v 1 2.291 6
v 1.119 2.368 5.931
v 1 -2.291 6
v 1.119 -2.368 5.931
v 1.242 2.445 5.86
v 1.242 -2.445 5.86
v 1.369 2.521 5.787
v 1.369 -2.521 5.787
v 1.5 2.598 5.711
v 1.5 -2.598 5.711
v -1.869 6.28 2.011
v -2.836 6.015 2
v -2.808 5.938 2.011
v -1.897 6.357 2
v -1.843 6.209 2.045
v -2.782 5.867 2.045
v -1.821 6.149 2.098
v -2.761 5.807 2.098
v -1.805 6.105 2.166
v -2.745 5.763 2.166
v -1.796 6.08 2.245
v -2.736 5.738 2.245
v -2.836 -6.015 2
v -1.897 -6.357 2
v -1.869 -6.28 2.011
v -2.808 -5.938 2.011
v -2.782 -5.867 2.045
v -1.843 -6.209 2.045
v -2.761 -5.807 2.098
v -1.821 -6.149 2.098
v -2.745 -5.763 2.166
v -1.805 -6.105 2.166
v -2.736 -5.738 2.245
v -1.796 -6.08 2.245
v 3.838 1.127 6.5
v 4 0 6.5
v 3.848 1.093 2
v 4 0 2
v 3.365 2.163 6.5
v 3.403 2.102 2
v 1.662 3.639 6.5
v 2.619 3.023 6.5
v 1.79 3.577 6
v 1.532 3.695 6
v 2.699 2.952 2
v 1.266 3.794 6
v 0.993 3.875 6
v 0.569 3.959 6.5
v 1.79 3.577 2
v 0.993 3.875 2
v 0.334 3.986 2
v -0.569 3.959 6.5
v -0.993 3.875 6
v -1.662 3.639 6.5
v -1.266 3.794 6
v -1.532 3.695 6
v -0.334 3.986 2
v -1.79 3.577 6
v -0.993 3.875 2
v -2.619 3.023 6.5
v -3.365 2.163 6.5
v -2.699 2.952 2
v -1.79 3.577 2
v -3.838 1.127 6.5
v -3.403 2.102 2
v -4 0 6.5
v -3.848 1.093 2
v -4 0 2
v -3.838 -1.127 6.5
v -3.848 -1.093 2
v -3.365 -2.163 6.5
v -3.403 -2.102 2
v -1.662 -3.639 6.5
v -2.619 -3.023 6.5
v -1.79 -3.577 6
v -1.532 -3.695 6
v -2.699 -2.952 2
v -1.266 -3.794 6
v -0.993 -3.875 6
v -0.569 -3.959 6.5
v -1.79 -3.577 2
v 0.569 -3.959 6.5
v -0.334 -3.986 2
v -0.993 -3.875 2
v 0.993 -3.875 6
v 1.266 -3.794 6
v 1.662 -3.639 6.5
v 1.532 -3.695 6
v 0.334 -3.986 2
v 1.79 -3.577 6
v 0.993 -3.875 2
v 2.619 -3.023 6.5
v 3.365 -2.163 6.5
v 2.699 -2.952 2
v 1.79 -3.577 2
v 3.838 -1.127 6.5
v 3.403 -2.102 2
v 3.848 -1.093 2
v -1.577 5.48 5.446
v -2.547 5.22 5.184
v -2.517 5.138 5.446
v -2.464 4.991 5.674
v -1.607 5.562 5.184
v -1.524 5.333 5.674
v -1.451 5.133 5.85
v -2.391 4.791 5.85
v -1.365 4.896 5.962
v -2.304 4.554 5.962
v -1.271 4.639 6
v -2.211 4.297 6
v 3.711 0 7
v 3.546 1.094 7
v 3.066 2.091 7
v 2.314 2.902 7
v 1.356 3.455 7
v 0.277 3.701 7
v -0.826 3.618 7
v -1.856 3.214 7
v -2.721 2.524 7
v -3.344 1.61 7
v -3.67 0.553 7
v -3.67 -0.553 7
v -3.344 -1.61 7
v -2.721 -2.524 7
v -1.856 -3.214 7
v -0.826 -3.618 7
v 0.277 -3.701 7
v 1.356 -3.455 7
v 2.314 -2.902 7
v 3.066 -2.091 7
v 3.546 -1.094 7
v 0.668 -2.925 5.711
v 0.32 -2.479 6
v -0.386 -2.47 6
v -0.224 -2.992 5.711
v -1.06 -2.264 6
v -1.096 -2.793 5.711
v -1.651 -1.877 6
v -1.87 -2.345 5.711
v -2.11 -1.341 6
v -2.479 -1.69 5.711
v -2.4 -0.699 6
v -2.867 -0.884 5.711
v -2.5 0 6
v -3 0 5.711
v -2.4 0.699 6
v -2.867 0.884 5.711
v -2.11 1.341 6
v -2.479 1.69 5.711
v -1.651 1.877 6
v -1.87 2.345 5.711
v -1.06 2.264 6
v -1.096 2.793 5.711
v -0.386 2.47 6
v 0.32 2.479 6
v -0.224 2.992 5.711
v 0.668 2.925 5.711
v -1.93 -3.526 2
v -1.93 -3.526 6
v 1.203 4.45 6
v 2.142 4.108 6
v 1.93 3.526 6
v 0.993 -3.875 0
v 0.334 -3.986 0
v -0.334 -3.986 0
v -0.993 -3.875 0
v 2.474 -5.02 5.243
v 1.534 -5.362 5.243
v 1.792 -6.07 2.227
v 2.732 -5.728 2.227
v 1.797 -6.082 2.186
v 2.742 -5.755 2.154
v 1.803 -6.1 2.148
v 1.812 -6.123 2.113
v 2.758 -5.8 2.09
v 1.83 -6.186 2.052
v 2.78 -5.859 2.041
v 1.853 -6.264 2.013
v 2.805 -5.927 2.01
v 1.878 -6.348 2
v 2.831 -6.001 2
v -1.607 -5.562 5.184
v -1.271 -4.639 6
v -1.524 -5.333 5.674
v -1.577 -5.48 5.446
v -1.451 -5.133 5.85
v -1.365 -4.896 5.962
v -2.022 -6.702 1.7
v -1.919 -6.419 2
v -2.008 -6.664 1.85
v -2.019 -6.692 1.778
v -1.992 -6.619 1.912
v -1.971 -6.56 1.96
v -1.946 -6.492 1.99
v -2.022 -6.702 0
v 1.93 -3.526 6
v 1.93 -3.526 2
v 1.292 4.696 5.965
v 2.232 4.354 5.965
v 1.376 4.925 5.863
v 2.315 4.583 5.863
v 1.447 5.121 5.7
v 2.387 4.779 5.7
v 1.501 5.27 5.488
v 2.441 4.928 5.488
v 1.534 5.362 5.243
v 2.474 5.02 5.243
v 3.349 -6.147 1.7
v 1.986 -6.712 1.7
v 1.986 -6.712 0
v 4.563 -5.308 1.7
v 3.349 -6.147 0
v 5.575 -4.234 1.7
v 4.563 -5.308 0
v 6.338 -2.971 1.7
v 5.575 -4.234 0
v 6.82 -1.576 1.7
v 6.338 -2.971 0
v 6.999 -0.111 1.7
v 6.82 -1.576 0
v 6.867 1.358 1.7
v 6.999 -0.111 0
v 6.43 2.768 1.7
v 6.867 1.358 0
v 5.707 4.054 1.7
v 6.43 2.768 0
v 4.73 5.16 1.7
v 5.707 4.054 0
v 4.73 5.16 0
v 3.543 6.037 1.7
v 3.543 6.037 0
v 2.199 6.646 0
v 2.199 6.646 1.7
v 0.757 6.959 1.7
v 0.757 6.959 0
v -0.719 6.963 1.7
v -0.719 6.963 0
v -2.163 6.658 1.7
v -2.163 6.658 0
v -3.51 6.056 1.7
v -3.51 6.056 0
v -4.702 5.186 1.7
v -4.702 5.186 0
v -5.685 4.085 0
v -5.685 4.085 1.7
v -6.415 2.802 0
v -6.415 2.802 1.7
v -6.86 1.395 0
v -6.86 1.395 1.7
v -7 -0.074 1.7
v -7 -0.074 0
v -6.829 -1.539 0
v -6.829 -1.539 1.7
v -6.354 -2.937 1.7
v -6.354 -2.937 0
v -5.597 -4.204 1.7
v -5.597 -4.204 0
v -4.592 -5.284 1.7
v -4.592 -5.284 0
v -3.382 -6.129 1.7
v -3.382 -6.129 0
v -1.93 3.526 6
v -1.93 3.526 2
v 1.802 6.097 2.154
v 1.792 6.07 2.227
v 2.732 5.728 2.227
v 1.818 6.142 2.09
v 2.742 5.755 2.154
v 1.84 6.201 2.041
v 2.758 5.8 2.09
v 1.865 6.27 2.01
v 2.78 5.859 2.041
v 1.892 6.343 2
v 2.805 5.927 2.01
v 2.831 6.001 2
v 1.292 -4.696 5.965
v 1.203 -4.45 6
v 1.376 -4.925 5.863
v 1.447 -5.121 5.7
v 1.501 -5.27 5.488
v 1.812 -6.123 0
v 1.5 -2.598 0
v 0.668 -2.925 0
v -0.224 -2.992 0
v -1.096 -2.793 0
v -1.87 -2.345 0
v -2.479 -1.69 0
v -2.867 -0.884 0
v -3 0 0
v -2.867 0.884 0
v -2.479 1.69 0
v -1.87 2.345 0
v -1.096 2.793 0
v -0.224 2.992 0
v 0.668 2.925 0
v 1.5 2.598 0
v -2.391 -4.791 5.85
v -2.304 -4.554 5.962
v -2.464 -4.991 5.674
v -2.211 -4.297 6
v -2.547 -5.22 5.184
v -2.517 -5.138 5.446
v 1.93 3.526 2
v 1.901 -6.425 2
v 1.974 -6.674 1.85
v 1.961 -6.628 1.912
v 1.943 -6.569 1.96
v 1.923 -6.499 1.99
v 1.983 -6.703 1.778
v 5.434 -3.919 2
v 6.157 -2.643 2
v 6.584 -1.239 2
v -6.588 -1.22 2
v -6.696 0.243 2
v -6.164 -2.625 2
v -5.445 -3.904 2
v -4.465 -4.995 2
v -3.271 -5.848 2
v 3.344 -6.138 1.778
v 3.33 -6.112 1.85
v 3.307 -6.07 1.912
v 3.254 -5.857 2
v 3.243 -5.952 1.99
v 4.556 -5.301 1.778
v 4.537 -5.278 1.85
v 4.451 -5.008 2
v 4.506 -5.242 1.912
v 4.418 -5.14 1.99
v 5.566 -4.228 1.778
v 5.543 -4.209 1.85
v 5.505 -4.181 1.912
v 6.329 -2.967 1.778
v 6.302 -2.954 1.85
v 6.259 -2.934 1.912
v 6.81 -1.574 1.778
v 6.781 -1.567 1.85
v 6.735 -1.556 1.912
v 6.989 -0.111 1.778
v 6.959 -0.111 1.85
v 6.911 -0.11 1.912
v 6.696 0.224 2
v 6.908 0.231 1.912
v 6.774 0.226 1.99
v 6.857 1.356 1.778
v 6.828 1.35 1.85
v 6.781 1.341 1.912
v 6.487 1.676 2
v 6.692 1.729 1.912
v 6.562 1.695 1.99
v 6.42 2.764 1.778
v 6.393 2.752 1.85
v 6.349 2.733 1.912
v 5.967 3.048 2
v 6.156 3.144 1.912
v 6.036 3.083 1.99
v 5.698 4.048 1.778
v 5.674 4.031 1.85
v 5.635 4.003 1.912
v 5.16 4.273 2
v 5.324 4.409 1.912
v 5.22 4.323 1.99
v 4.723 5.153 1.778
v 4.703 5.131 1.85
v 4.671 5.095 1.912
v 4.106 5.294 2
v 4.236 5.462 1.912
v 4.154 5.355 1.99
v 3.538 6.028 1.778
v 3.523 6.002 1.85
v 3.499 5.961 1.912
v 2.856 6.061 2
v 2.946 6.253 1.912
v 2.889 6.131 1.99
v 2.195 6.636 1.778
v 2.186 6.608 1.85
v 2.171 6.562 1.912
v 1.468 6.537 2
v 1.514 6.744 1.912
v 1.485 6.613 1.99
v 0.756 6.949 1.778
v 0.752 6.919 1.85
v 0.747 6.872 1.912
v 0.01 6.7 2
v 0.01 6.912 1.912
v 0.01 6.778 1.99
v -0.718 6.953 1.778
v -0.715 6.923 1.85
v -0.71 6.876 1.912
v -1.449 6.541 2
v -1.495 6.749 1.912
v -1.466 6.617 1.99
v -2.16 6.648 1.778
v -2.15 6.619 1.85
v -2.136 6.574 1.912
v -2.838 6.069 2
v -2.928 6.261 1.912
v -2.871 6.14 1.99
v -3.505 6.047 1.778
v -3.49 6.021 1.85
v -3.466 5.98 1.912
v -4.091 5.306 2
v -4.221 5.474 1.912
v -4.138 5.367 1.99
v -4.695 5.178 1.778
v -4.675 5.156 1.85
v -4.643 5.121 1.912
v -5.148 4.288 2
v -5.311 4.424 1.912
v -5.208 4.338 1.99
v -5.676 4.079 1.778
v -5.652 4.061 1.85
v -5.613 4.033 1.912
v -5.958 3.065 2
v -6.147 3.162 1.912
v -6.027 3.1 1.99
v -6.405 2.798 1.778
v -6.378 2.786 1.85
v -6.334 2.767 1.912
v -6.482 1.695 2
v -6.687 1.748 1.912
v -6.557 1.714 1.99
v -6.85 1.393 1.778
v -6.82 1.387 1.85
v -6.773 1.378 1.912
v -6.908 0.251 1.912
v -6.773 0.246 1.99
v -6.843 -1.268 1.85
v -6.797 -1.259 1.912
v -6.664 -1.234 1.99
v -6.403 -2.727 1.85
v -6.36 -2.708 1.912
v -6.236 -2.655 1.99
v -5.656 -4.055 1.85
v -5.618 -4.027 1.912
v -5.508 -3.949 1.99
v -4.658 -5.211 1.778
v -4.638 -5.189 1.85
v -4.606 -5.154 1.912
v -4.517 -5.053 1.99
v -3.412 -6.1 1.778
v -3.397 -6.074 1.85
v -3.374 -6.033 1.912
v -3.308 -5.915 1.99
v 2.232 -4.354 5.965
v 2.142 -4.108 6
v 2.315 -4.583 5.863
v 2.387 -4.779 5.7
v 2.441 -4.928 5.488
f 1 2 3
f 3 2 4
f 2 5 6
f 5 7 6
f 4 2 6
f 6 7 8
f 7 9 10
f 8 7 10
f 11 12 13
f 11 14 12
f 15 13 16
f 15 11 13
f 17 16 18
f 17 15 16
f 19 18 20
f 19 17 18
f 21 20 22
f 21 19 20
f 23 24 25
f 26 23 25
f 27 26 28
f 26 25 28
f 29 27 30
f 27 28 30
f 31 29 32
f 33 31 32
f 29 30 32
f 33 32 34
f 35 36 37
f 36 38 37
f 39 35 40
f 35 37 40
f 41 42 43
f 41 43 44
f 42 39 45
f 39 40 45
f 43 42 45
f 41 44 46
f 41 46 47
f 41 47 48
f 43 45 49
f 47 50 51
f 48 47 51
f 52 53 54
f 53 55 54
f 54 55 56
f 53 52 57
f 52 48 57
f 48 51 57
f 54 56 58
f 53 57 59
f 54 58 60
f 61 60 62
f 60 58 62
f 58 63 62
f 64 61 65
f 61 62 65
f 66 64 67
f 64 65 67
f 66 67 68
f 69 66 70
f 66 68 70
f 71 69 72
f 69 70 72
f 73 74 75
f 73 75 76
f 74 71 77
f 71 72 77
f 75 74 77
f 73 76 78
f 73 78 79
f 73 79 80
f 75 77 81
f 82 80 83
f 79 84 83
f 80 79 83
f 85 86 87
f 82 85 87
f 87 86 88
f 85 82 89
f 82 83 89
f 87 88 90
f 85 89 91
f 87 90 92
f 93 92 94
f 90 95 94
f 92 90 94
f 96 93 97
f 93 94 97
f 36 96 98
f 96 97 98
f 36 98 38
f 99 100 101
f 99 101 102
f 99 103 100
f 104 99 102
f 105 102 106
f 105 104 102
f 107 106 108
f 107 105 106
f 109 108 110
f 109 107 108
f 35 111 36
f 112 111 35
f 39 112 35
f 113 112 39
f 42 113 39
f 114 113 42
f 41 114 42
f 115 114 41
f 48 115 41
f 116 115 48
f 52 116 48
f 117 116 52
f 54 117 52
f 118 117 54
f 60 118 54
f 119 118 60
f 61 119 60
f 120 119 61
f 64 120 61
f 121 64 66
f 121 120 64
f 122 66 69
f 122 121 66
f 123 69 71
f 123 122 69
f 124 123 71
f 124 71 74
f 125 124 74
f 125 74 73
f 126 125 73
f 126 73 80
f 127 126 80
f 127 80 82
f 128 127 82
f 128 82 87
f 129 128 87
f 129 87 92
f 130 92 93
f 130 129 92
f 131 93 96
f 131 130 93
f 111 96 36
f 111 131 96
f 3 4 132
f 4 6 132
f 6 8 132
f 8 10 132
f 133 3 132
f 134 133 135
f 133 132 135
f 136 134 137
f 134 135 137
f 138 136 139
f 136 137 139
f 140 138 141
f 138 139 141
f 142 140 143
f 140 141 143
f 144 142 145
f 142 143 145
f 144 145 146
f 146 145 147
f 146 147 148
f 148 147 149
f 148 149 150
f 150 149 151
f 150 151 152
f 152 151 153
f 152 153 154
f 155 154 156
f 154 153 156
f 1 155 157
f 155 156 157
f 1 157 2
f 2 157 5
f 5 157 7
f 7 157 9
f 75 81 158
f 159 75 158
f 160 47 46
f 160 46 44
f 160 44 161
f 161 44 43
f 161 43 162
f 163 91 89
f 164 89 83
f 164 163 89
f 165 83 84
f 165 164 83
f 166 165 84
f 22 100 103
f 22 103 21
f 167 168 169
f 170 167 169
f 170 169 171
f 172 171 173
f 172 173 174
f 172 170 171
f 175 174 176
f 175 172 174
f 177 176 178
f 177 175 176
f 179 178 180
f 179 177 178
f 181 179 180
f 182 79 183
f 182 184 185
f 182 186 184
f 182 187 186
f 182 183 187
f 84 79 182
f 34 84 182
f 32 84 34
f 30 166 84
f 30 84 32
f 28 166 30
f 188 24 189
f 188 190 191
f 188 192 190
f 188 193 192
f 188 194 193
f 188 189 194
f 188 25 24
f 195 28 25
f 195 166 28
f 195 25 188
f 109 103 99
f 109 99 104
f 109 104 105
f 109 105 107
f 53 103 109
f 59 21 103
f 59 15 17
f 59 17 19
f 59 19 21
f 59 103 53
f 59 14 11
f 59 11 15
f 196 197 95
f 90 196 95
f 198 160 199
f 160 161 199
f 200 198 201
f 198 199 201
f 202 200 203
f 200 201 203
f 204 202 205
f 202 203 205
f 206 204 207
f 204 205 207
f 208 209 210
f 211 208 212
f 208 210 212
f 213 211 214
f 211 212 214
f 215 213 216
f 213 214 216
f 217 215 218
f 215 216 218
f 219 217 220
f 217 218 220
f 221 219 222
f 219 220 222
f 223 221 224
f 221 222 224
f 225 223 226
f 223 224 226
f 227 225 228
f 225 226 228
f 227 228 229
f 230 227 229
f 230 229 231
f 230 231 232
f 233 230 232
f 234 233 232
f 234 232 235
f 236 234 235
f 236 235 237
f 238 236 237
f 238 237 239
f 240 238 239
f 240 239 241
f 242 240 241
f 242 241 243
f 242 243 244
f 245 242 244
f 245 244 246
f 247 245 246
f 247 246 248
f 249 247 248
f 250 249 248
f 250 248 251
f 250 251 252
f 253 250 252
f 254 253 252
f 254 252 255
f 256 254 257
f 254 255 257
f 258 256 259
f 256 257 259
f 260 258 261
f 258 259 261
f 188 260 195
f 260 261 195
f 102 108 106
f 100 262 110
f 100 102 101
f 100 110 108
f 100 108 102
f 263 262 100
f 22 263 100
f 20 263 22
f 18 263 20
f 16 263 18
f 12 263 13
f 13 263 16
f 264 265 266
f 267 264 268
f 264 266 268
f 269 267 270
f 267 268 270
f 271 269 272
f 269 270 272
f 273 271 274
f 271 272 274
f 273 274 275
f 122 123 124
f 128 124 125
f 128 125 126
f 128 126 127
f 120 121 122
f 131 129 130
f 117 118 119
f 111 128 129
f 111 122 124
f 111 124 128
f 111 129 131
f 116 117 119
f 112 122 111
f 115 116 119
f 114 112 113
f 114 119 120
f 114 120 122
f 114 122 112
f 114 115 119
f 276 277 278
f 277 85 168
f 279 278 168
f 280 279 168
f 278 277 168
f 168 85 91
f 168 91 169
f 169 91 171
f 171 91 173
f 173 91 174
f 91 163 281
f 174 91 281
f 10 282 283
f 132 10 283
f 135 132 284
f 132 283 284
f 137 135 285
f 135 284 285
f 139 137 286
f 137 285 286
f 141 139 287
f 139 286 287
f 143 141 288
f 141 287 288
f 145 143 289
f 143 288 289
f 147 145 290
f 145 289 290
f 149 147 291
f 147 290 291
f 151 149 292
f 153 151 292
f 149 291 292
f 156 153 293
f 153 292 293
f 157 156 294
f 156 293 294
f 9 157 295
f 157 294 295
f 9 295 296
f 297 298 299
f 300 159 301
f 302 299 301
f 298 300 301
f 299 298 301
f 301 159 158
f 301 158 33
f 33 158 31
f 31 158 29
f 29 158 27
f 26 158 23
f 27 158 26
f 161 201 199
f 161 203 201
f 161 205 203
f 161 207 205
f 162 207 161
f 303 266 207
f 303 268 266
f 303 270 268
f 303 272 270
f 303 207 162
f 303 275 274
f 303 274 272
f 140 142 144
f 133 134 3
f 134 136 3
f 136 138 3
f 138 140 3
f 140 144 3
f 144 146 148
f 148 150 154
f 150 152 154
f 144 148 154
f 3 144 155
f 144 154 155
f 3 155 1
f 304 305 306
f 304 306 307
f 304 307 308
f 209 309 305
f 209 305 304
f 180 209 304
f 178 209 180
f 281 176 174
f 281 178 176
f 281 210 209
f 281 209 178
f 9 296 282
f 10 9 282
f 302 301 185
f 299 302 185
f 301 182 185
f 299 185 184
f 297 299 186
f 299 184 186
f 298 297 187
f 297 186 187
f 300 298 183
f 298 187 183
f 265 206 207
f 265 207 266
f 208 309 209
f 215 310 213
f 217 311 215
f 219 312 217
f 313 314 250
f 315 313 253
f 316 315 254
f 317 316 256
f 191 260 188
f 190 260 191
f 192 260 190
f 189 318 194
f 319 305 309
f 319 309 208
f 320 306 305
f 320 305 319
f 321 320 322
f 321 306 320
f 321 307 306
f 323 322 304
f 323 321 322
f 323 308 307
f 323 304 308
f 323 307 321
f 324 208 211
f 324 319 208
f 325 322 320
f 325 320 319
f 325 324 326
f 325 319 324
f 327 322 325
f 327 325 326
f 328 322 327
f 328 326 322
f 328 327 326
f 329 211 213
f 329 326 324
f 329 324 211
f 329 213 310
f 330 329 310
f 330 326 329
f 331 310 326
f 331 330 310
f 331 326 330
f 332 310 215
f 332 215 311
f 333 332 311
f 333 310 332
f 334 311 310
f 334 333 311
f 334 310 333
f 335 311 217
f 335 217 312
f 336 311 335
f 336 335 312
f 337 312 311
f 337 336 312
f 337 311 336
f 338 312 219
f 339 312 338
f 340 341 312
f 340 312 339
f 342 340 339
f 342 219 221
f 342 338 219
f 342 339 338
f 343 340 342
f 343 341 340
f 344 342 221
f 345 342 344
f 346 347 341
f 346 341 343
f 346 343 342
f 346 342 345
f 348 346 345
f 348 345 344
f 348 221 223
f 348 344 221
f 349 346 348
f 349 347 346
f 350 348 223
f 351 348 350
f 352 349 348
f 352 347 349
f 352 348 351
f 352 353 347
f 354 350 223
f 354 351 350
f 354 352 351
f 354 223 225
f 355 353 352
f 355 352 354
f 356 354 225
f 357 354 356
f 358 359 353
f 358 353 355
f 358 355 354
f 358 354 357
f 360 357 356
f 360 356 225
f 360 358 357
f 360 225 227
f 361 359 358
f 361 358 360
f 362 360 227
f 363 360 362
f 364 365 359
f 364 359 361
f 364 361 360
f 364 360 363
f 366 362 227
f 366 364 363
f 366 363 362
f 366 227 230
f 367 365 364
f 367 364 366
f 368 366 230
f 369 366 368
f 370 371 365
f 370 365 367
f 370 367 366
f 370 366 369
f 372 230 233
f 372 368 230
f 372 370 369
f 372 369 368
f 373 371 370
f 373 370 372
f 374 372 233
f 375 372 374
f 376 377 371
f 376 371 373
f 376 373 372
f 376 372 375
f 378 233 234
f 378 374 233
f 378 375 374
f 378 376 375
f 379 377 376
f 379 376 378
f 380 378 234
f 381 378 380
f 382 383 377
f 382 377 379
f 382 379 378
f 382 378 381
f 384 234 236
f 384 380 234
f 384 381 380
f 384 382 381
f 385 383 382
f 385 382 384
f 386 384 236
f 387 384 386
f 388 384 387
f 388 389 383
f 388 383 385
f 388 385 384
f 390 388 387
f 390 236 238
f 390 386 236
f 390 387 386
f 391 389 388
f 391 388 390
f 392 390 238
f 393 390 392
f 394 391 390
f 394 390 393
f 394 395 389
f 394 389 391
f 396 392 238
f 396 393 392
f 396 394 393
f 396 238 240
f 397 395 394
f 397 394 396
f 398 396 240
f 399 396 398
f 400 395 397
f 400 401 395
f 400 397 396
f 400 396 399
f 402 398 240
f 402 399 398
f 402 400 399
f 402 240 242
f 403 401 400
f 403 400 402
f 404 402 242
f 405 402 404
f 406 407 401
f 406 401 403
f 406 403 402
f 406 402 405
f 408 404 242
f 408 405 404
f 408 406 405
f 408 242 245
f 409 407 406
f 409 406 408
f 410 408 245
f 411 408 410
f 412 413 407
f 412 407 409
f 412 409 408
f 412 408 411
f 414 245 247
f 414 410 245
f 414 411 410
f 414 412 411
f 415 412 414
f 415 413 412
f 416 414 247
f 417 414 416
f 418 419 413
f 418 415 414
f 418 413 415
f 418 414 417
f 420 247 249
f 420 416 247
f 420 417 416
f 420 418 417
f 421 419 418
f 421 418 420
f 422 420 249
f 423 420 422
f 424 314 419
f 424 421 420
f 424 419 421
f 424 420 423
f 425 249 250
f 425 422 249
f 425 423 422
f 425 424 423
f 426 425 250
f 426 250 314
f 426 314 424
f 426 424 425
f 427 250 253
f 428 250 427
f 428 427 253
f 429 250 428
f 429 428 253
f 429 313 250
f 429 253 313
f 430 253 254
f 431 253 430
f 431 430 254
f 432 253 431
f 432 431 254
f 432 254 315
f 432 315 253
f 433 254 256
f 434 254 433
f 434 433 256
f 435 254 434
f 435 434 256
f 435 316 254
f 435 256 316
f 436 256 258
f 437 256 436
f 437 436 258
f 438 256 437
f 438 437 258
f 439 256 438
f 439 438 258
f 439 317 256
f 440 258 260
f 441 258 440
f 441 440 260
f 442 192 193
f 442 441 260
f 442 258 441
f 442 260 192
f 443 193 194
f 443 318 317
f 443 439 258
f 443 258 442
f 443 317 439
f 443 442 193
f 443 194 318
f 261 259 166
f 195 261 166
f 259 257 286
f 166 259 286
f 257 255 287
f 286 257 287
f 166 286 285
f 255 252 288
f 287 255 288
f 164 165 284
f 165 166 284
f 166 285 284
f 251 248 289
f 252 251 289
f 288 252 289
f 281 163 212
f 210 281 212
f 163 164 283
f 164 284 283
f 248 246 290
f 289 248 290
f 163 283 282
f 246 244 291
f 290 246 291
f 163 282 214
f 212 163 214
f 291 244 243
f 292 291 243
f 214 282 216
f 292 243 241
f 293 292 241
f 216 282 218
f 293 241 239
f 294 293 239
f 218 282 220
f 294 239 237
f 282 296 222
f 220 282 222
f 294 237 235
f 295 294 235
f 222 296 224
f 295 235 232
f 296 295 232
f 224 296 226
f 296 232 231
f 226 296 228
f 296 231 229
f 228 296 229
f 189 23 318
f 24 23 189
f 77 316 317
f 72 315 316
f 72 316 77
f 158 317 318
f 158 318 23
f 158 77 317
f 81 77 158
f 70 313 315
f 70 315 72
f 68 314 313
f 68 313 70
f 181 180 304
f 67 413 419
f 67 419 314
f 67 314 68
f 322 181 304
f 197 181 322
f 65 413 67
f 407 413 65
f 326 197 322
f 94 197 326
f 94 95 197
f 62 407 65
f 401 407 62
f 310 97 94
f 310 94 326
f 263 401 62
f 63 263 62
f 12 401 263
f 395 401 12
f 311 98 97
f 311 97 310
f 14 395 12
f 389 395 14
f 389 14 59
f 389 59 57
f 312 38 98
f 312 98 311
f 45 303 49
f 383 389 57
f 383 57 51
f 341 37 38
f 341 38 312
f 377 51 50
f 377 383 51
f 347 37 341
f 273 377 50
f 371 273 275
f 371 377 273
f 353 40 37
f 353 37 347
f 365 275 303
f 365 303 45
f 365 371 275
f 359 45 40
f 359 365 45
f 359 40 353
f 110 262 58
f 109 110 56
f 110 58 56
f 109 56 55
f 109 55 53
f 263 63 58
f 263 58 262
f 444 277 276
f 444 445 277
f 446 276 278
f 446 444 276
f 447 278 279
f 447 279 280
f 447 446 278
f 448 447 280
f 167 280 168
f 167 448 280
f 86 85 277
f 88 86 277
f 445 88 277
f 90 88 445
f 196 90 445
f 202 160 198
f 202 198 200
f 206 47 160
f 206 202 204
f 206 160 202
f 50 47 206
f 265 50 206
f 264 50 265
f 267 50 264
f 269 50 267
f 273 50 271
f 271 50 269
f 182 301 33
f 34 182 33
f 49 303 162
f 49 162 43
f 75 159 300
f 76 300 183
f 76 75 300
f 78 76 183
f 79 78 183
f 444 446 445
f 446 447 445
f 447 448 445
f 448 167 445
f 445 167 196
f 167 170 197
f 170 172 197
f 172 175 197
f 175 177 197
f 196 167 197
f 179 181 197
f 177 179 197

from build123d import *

# Parameters (mm, degrees)
SZKIC1_R                          = 4
DODANIE_WYCI_GNI_CIE1_DEPTH       = 6
SZKIC1_3_R                        = 7
SZKIC1_3_R_2                      = 4
DODANIE_WYCI_GNI_CIE2_DEPTH       = 2
DODANIE_WYCI_GNI_CIE3_START       = 6
SZKIC1_4_R                        = 4
DODANIE_WYCI_GNI_CIE3_DEPTH       = 1
SFAZOWANIE1_SIZE                  = 0.5
SFAZOWANIE1_SIZE2                 = 0.28867513459481364
SFAZOWANIE2_SIZE                  = 0.5
SFAZOWANIE2_SIZE2                 = 0.28867513459481364
WYCI_GNI_CIE_CIENKA_CIANKA1_DEPTH = 4
WYTNIJ_WYCI_GNI_CIE1_DEPTH        = 4
WYTNIJ_WYCI_GNI_CIE2_DEPTH        = 4
ZAOKR_GLENIE2_R                   = 1
WYTNIJ_WYCI_GNI_CIE3_START        = -4
WYTNIJ_WYCI_GNI_CIE3_DEPTH        = 4
ZAOKR_GLENIE4_R                   = 0.3
ZAOKR_GLENIE5_R                   = 0.3
ZAOKR_GLENIE2_OF_LUSTRO2_R        = 1
ZAOKR_GLENIE4_OF_LUSTRO2_R        = 0.3


with BuildPart() as part:
    # Szkic1 → Dodanie-wyci_gni_cie1 (new body)
    with BuildSketch(Plane.XY):
        Circle(SZKIC1_R)
        with BuildLine():
            Line((1.5, 2.5980762113533156), (1.5, -2.5980762113533156))
            ThreePointArc((1.4999999999999998, -2.598076211353315), (-2.999999999999999, 3.7e-16), (1.4999999999999998, 2.598076211353315))
        make_face(mode=Mode.SUBTRACT)
    extrude(amount=DODANIE_WYCI_GNI_CIE1_DEPTH)

    # Szkic1_3 → Dodanie-wyci_gni_cie2 (add)
    with BuildSketch(Plane.XY):
        Circle(SZKIC1_3_R)
        Circle(SZKIC1_3_R_2, mode=Mode.SUBTRACT)
    extrude(amount=DODANIE_WYCI_GNI_CIE2_DEPTH)

    # Szkic1_4 → Dodanie-wyci_gni_cie3 (add)
    with BuildSketch(Plane.XY.offset(DODANIE_WYCI_GNI_CIE3_START)):
        Circle(SZKIC1_4_R)
    extrude(amount=DODANIE_WYCI_GNI_CIE3_DEPTH)

    # Sfazowanie1
    sfazowanie1_edges = [part.edges().sort_by_distance(p)[0] for p in [
        (-2.999999999999999, 8.9e-16, 6),
        (1.5, 0, 6),
    ]]
    sfazowanie1_side = [part.faces().sort_by_distance(p)[0] for p in [
        (-0.5139804124502736, 6.2e-16, 6),
    ]]
    chamfer(sfazowanie1_edges, length=SFAZOWANIE1_SIZE, length2=SFAZOWANIE1_SIZE2, reference=sfazowanie1_side[0])

    # Sfazowanie2
    sfazowanie2_edges = [part.edges().sort_by_distance(p)[0] for p in [
        (-4, 4.9e-16, 7),
    ]]
    sfazowanie2_side = [part.faces().sort_by_distance(p)[0] for p in [
        (-4, 4.9e-16, 4.5),
    ]]
    chamfer(sfazowanie2_edges, length=SFAZOWANIE2_SIZE, length2=SFAZOWANIE2_SIZE2, reference=sfazowanie2_side[0])

    # Szkic3 → Wyci_gni_cie-cienka _cianka1 (add)
    with BuildSketch(Plane.XY.offset(2)):
        Polygon((0.9907558800275146, -3.8680137479259677), (1.811604224009121, -6.123276037812147), (2.751296844795029, -5.781255894486478), (1.930448500813423, -3.5259936046002984), align=None)
        Polygon((-1.930448500813423, -3.525993604600299), (-2.7512968447950286, -5.7812558944864785), (-1.81160422400912, -6.123276037812148), (-0.9907558800275145, -3.868013747925968), align=None)
    wyci_gni_cie_cienka_cianka1 = extrude(amount=WYCI_GNI_CIE_CIENKA_CIANKA1_DEPTH)

    # Szkic4 → Wytnij-wyci_gni_cie1 (cut)
    with BuildSketch(Plane(origin=(-0.5713964233589274, 0.2079712900688191, 0), x_dir=(0, 0, 1), z_dir=(-0.9396926207859082, 0.3420201433256693, 0))):
        Polygon((6, -6.373602444112237), (6, -5.623602444112237), (2, -6.373602444112238), align=None)
    wytnij_wyci_gni_cie1 = extrude(amount=-WYTNIJ_WYCI_GNI_CIE1_DEPTH, mode=Mode.SUBTRACT)

    # Szkic5 → Wytnij-wyci_gni_cie2 (cut)
    with BuildSketch(Plane(origin=(-0.36829619742698255, -0.13404885325685056, 0), x_dir=(0, 0, 1), z_dir=(-0.939692620785908, -0.3420201433256696, 0))):
        Polygon((2, -6.373602444112238), (6, -6.373602444112237), (6, -5.373602444112237), align=None)
    wytnij_wyci_gni_cie2 = extrude(amount=-WYTNIJ_WYCI_GNI_CIE2_DEPTH, mode=Mode.SUBTRACT)

    # Zaokr_glenie2
    zaokr_glenie2_edges = [part.edges().sort_by_distance(p)[0] for p in [
        (1.9394303910764068, -5.012573345363405, 6),
        (-2.0249354269078235, -5.247496500559882, 6),
    ]]
    fillet(zaokr_glenie2_edges, radius=ZAOKR_GLENIE2_R)

    # Szkic6 → Wytnij-wyci_gni_cie3 (cut)
    with BuildSketch(Plane.XY.offset(2).offset(WYTNIJ_WYCI_GNI_CIE3_START)):
        with BuildLine():
            Line((-1.8116042240091212, -6.12327603781215), (-2.0220891373099885, -6.701578584242144))
            ThreePointArc((-2.0220891373099885, -6.701578584242144), (-0.0188863375955117, -6.999974521828791), (1.985897465033318, -6.7123923647515005))
            Line((1.985897465033318, -6.7123923647515005), (1.8116042240091235, -6.12327603781215))
            Line((1.8116042240091235, -6.12327603781215), (0.9932012722690525, -3.8747324078913032))
            ThreePointArc((0.9932012722690525, -3.8747324078913032), (-9e-16, -3.999999999999983), (-0.9932012722690527, -3.874732407891303))
            Line((-0.9932012722690527, -3.874732407891303), (-1.8116042240091212, -6.12327603781215))
        make_face()
    extrude(amount=WYTNIJ_WYCI_GNI_CIE3_DEPTH, mode=Mode.SUBTRACT)

    # Zaokr_glenie4
    zaokr_glenie4_edges = [part.edges().sort_by_distance(p)[0] for p in [
        (2.281450534402075, -5.952265966149312, 2),
        (-2.281450534402074, -5.952265966149313, 2),
    ]]
    fillet(zaokr_glenie4_edges, radius=ZAOKR_GLENIE4_R)

    # Zaokr_glenie5
    zaokr_glenie5_edges = [part.edges().sort_by_distance(p)[0] for p in [
        (0.0188863375955115, 6.999974521828793, 2),
    ]]
    fillet(zaokr_glenie5_edges, radius=ZAOKR_GLENIE5_R)

    # Lustro2: Wyci_gni_cie-cienka _cianka1, Wytnij-wyci_gni_cie1, Wytnij-wyci_gni_cie2 across plane
    add(wyci_gni_cie_cienka_cianka1.mirror(Plane.ZX))
    add(wytnij_wyci_gni_cie1.mirror(Plane.ZX), mode=Mode.SUBTRACT)
    add(wytnij_wyci_gni_cie2.mirror(Plane.ZX), mode=Mode.SUBTRACT)

    # Zaokr_glenie2 of Lustro2
    zaokr_glenie2_of_lustro2_edges = [part.edges().sort_by_distance(p)[0] for p in [
        (1.9394303910764068, 5.012573345363405, 6),
        (-2.0249354269078235, 5.247496500559882, 6),
    ]]
    fillet(zaokr_glenie2_of_lustro2_edges, radius=ZAOKR_GLENIE2_OF_LUSTRO2_R)

    # Zaokr_glenie4 of Lustro2
    zaokr_glenie4_of_lustro2_edges = [part.edges().sort_by_distance(p)[0] for p in [
        (2.281450534402075, 5.952265966149312, 2),
        (-2.281450534402074, 5.952265966149313, 2),
    ]]
    fillet(zaokr_glenie4_of_lustro2_edges, radius=ZAOKR_GLENIE4_OF_LUSTRO2_R)


solid = part.part
